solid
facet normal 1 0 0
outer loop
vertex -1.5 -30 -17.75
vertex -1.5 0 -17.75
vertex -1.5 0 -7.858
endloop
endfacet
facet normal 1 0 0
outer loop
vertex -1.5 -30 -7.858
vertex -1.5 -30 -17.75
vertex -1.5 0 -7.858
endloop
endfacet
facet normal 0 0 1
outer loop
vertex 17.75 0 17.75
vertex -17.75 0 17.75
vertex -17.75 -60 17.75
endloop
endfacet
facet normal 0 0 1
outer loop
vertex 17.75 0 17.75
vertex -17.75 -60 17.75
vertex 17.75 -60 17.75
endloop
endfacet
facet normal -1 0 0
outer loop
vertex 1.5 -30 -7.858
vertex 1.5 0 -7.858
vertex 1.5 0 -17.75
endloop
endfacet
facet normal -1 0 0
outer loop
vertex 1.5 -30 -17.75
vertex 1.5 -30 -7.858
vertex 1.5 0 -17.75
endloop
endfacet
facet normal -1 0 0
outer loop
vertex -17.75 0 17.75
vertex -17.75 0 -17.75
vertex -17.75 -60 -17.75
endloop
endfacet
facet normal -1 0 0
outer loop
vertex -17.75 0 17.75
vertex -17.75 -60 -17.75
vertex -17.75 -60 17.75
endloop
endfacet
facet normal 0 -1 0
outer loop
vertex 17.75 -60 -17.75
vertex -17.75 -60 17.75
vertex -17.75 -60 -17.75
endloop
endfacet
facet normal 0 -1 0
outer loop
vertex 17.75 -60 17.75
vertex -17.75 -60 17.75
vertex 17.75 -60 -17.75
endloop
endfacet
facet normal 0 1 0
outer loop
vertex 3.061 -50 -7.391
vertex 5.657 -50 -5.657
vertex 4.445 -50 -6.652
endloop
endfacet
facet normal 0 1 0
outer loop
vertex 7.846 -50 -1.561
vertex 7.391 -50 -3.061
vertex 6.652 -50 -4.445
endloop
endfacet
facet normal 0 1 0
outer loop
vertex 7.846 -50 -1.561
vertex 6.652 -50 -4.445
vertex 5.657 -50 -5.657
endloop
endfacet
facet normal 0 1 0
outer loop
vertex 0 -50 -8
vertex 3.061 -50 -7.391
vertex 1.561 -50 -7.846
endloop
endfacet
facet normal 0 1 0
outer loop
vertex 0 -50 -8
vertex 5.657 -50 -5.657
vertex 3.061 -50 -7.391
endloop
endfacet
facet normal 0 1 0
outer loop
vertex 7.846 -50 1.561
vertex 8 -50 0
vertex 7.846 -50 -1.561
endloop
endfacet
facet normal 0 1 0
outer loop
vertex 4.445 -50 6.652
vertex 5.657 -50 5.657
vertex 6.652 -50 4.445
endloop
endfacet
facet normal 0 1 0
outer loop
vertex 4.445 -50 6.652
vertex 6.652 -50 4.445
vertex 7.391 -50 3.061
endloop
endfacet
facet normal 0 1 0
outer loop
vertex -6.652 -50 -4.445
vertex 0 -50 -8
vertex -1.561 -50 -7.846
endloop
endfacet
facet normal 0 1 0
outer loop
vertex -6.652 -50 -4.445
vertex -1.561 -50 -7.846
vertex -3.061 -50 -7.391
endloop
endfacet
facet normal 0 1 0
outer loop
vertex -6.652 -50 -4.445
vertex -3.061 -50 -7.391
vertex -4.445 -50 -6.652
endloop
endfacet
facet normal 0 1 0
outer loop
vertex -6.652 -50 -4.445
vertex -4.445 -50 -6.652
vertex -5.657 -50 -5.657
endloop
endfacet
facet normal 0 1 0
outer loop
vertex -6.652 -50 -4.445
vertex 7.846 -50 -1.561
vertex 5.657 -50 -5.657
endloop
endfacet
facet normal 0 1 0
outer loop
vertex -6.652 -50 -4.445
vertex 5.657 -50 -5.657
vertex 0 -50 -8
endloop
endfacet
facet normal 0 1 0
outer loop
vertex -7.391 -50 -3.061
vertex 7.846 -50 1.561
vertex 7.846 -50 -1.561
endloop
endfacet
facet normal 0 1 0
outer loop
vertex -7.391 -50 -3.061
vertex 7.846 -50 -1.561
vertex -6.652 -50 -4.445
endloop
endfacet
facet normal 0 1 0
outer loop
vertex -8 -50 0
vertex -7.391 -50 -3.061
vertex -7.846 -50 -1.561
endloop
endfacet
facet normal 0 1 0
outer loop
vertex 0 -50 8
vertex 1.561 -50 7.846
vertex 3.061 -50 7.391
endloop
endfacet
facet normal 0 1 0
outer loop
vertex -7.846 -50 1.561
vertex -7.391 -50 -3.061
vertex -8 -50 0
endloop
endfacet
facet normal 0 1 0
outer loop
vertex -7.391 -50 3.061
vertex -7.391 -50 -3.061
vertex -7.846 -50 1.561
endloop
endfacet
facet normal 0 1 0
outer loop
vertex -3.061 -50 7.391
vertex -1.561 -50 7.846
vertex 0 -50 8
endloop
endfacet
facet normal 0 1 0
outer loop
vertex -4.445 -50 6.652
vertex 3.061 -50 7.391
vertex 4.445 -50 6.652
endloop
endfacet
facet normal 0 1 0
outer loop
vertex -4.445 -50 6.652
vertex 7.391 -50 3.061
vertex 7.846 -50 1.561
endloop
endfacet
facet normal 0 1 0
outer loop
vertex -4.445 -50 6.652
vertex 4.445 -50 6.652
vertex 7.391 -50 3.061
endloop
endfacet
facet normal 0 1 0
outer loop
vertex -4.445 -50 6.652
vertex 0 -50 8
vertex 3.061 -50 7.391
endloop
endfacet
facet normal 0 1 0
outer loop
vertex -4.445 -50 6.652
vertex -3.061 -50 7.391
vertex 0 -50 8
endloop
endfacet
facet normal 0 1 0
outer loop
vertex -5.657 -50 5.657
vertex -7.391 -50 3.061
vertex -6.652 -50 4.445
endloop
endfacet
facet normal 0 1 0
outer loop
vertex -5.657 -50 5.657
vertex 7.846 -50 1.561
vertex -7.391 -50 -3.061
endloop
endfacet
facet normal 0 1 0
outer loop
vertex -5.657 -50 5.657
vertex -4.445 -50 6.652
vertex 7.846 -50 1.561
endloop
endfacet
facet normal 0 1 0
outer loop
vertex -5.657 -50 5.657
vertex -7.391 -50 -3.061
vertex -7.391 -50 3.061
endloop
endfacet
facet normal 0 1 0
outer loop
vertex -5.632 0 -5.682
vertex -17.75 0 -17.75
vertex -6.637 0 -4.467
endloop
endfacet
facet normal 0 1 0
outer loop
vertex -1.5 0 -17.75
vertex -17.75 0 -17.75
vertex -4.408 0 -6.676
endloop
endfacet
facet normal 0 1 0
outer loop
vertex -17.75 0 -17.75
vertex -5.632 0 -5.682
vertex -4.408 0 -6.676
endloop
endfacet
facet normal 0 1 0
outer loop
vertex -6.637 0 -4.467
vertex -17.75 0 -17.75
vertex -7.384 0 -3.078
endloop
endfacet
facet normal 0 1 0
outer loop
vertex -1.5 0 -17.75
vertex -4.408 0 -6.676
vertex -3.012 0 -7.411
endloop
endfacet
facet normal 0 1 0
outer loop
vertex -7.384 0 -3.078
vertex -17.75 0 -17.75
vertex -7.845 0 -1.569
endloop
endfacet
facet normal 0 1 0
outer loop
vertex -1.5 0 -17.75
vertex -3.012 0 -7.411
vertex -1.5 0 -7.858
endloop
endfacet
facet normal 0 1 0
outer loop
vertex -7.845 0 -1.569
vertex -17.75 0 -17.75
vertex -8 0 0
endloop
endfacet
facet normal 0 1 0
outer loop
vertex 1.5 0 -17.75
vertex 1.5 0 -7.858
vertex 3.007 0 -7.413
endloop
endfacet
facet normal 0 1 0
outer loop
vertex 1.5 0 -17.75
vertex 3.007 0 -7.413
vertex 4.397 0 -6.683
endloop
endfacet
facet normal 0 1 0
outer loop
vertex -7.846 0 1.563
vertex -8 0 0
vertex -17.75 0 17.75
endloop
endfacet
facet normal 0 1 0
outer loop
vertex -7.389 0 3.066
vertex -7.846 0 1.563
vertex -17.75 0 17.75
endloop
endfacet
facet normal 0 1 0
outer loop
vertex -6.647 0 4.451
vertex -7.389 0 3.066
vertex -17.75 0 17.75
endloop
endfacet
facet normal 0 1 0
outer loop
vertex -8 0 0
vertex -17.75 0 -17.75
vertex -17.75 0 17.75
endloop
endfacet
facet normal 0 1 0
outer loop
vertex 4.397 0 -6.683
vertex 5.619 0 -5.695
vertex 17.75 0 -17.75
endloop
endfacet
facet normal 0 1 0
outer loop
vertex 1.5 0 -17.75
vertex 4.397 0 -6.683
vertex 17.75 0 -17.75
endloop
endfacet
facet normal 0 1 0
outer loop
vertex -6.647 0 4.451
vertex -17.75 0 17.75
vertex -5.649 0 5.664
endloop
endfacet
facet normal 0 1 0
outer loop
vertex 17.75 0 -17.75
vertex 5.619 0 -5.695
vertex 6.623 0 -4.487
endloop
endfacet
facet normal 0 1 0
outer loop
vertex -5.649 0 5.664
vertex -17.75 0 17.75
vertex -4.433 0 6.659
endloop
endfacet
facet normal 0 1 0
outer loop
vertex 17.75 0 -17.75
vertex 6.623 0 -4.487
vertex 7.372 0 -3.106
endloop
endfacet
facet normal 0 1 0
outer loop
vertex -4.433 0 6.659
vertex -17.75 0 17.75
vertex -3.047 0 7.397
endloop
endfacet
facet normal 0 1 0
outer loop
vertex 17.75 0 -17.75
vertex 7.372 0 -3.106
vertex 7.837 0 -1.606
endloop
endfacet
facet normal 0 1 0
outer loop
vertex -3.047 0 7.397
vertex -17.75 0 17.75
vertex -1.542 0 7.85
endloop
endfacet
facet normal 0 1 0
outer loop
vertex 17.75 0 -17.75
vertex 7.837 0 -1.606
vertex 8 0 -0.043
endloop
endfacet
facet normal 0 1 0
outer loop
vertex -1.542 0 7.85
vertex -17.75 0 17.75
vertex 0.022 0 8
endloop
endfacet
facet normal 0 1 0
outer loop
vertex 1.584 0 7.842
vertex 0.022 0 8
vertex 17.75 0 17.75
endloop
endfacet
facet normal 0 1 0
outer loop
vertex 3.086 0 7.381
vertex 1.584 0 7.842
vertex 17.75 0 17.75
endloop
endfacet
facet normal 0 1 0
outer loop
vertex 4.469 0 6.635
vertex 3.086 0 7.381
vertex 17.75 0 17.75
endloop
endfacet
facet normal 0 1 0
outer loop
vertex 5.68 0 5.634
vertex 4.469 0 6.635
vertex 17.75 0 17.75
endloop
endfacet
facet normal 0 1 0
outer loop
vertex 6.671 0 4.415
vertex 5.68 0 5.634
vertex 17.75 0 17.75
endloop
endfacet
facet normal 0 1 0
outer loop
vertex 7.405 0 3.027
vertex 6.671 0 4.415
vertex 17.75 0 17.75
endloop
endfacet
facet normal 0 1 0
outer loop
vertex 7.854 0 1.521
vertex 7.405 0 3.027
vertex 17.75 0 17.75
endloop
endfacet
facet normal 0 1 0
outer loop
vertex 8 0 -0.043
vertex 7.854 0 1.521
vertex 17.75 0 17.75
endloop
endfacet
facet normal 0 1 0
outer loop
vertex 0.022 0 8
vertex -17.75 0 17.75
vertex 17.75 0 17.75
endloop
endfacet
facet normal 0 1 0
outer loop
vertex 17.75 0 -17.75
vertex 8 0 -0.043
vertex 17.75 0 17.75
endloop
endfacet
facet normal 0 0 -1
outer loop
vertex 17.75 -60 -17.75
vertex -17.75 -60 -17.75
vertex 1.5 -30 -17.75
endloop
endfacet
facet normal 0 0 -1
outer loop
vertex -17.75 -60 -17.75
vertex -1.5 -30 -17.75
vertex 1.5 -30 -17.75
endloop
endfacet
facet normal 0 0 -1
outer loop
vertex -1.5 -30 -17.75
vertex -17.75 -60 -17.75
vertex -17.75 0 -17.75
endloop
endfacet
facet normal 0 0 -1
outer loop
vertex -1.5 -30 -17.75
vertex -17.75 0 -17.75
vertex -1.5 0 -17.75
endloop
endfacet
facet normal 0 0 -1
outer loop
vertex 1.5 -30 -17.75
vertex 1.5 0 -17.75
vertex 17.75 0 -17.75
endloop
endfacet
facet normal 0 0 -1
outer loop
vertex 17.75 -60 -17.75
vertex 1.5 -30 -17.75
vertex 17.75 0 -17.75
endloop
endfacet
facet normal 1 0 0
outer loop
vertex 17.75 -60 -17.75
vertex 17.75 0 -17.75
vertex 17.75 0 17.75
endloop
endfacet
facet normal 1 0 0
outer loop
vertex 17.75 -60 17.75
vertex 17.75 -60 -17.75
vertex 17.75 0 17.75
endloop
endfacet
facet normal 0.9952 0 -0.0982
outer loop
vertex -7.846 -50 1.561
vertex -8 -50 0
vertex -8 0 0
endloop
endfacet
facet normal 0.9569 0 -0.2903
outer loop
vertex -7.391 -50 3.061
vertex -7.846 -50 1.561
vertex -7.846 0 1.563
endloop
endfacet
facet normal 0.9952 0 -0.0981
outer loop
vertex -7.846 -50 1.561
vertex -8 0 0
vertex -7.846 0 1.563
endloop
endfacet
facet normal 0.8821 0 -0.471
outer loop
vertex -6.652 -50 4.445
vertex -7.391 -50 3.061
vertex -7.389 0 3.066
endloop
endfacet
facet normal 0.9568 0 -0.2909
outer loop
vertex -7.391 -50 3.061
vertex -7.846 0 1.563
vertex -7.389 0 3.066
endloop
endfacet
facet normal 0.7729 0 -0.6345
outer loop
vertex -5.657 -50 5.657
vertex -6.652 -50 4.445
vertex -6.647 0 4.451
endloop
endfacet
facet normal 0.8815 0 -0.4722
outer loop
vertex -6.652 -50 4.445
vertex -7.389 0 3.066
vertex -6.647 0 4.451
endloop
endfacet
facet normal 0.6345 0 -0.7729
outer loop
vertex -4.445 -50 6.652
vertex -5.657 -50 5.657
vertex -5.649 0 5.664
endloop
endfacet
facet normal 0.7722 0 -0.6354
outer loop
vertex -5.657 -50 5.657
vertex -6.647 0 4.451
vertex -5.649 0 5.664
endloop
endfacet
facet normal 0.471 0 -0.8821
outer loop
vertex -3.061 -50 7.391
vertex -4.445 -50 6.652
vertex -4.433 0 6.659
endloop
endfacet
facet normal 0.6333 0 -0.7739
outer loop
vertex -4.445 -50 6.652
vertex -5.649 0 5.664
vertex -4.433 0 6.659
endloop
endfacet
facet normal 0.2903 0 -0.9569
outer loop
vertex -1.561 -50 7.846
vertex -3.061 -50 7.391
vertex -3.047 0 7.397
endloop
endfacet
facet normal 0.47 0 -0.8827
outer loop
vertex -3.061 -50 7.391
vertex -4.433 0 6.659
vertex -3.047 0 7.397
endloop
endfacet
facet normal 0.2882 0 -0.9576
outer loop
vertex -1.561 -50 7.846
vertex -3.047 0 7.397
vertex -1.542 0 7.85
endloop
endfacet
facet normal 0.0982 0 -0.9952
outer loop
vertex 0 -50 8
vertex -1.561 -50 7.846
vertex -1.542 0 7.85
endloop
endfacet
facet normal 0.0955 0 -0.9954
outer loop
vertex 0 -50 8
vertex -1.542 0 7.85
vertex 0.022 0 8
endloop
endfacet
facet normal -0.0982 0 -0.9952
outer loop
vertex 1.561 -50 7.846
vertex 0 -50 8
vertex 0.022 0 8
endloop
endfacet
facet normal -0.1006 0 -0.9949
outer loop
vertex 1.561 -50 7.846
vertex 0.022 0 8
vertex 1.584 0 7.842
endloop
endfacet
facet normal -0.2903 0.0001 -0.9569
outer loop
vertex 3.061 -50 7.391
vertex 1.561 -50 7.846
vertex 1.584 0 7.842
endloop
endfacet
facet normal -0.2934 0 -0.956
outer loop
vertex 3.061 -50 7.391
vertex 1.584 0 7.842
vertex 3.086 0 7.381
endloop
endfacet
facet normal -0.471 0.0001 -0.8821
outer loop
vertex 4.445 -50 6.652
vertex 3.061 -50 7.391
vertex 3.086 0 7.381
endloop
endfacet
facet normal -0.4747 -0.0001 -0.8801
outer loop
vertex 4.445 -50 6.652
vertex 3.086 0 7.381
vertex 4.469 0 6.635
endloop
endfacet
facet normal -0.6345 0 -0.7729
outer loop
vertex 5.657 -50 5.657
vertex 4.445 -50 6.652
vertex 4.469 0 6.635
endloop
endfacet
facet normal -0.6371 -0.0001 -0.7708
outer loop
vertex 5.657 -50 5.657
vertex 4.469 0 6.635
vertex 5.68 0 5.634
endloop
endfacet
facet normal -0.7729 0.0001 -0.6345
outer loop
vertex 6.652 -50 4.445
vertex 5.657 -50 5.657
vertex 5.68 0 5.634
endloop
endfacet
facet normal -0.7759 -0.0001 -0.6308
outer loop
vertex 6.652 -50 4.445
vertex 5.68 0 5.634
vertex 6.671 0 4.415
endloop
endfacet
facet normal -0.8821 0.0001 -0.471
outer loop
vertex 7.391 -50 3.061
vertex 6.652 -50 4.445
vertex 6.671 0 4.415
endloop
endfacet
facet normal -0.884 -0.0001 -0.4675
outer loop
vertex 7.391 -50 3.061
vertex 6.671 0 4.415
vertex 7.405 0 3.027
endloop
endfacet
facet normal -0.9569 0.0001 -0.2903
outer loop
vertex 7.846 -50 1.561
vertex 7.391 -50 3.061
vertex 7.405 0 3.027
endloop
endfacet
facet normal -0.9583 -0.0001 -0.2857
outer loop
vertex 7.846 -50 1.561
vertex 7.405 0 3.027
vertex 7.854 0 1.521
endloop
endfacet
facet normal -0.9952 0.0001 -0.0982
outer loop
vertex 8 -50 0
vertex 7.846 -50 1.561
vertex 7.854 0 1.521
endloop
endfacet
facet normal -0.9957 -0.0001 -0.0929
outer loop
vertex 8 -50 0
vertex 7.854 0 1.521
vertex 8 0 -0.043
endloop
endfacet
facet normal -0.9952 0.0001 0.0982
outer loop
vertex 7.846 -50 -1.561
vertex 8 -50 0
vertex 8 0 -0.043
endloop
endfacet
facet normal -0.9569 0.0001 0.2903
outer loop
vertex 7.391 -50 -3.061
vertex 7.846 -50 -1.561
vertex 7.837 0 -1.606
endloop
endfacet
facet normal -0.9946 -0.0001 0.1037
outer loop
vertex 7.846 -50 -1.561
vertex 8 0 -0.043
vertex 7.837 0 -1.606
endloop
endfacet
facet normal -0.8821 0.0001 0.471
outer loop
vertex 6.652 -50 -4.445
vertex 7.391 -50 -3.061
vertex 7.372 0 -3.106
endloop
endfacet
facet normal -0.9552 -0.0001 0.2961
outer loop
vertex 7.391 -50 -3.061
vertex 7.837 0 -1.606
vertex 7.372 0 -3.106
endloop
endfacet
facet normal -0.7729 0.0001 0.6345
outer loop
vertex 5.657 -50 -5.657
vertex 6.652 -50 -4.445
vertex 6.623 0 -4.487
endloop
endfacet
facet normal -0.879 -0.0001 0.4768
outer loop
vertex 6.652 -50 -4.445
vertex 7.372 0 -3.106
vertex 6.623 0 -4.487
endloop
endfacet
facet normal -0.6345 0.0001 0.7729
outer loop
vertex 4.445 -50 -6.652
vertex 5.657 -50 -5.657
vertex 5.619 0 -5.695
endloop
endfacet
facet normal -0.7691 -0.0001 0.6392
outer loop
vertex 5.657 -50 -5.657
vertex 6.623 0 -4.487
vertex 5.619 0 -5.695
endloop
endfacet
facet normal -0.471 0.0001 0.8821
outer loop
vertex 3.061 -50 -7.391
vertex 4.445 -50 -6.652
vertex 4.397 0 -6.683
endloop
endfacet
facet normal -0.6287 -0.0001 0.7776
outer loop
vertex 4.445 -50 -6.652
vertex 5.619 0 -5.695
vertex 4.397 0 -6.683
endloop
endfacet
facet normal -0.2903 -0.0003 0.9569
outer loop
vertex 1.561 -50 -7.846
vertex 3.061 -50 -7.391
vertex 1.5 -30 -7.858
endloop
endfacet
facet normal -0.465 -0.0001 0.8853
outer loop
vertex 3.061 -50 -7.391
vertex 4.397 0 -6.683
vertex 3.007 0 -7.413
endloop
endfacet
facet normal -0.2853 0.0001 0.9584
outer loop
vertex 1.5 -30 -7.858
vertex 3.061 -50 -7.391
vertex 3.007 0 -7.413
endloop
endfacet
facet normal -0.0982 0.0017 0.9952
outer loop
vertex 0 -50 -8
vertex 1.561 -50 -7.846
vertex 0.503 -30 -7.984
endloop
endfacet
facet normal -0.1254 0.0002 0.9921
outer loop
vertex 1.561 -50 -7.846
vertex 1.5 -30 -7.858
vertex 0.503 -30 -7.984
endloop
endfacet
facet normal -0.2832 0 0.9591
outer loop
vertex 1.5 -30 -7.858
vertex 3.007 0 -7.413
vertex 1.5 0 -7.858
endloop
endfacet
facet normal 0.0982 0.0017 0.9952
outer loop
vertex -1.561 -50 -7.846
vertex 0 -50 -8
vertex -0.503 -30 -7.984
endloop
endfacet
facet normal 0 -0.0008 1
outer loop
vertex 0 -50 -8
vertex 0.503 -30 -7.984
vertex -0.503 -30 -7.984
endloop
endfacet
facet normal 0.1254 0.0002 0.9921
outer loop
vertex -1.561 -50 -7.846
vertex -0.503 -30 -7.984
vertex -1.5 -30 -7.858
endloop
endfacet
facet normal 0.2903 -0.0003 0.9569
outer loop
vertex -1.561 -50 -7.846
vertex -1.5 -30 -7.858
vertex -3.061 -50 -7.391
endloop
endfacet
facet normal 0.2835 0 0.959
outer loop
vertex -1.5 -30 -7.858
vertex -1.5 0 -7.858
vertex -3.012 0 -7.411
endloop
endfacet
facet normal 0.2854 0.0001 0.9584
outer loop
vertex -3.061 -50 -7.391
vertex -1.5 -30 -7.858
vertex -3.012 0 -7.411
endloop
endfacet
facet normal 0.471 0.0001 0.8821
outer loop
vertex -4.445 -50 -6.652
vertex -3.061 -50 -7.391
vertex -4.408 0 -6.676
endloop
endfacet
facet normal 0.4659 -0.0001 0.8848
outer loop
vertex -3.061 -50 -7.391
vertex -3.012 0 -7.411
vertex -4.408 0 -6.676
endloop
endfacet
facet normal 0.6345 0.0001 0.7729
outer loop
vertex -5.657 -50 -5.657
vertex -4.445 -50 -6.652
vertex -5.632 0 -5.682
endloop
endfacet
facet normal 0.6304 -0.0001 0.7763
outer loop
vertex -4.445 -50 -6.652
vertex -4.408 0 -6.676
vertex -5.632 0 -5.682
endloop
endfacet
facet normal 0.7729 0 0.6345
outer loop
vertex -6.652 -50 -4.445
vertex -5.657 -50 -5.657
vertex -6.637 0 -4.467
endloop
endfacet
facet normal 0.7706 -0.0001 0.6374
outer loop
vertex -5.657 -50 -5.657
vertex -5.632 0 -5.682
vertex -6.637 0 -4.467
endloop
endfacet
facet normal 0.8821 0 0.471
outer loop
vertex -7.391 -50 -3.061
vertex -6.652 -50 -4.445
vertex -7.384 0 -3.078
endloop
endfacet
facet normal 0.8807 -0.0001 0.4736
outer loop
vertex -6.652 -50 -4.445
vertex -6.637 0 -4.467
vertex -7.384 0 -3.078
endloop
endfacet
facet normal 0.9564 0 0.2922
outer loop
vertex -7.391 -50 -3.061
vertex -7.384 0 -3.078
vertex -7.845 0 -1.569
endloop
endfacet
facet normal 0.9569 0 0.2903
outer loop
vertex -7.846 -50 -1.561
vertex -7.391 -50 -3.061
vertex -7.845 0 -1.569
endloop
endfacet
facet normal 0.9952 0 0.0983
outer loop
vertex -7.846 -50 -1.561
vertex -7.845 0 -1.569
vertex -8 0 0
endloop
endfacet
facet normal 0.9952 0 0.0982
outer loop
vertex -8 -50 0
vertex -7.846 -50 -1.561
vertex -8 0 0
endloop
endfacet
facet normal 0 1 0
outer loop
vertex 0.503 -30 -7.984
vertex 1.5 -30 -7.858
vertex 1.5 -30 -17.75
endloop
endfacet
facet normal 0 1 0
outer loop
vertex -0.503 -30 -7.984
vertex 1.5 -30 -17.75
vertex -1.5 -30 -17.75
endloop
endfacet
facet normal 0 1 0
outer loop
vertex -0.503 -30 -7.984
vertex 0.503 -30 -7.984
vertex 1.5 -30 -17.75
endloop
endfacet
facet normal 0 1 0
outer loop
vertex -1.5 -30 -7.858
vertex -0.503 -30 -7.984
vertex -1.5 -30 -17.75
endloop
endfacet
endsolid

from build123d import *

# Parameters (mm, degrees)
F0_W     = 35.5
F0_H     = 35.5
F1_DEPTH = 60
F2_R     = 8
F3_DEPTH = 50
F5_DEPTH = 30


with BuildPart() as f1:
    # F0 (on Front) → F1 (new body)
    with BuildSketch(Plane.XZ):
        Rectangle(F0_W, F0_H)
    extrude(amount=F1_DEPTH)

    # F2 (on face) → F3 (cut)
    with BuildSketch(Plane(origin=(0, 0, 0), x_dir=(-1, 0, 0), z_dir=(0, 1, 0))):
        Circle(F2_R)
    extrude(amount=-F3_DEPTH, mode=Mode.SUBTRACT)

    # F4 (on face) → F5 (cut)
    with BuildSketch(Plane(origin=(0, 0, 0), x_dir=(-1, 0, 0), z_dir=(0, 1, 0))):
        with BuildLine():
            ThreePointArc((1.5, -7.858117), (0, 8), (-1.5, -7.858117))
            Line((-1.5, -7.858117), (-1.5, -17.75))
            Line((-1.5, -17.75), (1.5, -17.75))
            Line((1.5, -17.75), (1.5, -7.858117))
        make_face()
    extrude(amount=-F5_DEPTH, mode=Mode.SUBTRACT)


solid = f1.part
